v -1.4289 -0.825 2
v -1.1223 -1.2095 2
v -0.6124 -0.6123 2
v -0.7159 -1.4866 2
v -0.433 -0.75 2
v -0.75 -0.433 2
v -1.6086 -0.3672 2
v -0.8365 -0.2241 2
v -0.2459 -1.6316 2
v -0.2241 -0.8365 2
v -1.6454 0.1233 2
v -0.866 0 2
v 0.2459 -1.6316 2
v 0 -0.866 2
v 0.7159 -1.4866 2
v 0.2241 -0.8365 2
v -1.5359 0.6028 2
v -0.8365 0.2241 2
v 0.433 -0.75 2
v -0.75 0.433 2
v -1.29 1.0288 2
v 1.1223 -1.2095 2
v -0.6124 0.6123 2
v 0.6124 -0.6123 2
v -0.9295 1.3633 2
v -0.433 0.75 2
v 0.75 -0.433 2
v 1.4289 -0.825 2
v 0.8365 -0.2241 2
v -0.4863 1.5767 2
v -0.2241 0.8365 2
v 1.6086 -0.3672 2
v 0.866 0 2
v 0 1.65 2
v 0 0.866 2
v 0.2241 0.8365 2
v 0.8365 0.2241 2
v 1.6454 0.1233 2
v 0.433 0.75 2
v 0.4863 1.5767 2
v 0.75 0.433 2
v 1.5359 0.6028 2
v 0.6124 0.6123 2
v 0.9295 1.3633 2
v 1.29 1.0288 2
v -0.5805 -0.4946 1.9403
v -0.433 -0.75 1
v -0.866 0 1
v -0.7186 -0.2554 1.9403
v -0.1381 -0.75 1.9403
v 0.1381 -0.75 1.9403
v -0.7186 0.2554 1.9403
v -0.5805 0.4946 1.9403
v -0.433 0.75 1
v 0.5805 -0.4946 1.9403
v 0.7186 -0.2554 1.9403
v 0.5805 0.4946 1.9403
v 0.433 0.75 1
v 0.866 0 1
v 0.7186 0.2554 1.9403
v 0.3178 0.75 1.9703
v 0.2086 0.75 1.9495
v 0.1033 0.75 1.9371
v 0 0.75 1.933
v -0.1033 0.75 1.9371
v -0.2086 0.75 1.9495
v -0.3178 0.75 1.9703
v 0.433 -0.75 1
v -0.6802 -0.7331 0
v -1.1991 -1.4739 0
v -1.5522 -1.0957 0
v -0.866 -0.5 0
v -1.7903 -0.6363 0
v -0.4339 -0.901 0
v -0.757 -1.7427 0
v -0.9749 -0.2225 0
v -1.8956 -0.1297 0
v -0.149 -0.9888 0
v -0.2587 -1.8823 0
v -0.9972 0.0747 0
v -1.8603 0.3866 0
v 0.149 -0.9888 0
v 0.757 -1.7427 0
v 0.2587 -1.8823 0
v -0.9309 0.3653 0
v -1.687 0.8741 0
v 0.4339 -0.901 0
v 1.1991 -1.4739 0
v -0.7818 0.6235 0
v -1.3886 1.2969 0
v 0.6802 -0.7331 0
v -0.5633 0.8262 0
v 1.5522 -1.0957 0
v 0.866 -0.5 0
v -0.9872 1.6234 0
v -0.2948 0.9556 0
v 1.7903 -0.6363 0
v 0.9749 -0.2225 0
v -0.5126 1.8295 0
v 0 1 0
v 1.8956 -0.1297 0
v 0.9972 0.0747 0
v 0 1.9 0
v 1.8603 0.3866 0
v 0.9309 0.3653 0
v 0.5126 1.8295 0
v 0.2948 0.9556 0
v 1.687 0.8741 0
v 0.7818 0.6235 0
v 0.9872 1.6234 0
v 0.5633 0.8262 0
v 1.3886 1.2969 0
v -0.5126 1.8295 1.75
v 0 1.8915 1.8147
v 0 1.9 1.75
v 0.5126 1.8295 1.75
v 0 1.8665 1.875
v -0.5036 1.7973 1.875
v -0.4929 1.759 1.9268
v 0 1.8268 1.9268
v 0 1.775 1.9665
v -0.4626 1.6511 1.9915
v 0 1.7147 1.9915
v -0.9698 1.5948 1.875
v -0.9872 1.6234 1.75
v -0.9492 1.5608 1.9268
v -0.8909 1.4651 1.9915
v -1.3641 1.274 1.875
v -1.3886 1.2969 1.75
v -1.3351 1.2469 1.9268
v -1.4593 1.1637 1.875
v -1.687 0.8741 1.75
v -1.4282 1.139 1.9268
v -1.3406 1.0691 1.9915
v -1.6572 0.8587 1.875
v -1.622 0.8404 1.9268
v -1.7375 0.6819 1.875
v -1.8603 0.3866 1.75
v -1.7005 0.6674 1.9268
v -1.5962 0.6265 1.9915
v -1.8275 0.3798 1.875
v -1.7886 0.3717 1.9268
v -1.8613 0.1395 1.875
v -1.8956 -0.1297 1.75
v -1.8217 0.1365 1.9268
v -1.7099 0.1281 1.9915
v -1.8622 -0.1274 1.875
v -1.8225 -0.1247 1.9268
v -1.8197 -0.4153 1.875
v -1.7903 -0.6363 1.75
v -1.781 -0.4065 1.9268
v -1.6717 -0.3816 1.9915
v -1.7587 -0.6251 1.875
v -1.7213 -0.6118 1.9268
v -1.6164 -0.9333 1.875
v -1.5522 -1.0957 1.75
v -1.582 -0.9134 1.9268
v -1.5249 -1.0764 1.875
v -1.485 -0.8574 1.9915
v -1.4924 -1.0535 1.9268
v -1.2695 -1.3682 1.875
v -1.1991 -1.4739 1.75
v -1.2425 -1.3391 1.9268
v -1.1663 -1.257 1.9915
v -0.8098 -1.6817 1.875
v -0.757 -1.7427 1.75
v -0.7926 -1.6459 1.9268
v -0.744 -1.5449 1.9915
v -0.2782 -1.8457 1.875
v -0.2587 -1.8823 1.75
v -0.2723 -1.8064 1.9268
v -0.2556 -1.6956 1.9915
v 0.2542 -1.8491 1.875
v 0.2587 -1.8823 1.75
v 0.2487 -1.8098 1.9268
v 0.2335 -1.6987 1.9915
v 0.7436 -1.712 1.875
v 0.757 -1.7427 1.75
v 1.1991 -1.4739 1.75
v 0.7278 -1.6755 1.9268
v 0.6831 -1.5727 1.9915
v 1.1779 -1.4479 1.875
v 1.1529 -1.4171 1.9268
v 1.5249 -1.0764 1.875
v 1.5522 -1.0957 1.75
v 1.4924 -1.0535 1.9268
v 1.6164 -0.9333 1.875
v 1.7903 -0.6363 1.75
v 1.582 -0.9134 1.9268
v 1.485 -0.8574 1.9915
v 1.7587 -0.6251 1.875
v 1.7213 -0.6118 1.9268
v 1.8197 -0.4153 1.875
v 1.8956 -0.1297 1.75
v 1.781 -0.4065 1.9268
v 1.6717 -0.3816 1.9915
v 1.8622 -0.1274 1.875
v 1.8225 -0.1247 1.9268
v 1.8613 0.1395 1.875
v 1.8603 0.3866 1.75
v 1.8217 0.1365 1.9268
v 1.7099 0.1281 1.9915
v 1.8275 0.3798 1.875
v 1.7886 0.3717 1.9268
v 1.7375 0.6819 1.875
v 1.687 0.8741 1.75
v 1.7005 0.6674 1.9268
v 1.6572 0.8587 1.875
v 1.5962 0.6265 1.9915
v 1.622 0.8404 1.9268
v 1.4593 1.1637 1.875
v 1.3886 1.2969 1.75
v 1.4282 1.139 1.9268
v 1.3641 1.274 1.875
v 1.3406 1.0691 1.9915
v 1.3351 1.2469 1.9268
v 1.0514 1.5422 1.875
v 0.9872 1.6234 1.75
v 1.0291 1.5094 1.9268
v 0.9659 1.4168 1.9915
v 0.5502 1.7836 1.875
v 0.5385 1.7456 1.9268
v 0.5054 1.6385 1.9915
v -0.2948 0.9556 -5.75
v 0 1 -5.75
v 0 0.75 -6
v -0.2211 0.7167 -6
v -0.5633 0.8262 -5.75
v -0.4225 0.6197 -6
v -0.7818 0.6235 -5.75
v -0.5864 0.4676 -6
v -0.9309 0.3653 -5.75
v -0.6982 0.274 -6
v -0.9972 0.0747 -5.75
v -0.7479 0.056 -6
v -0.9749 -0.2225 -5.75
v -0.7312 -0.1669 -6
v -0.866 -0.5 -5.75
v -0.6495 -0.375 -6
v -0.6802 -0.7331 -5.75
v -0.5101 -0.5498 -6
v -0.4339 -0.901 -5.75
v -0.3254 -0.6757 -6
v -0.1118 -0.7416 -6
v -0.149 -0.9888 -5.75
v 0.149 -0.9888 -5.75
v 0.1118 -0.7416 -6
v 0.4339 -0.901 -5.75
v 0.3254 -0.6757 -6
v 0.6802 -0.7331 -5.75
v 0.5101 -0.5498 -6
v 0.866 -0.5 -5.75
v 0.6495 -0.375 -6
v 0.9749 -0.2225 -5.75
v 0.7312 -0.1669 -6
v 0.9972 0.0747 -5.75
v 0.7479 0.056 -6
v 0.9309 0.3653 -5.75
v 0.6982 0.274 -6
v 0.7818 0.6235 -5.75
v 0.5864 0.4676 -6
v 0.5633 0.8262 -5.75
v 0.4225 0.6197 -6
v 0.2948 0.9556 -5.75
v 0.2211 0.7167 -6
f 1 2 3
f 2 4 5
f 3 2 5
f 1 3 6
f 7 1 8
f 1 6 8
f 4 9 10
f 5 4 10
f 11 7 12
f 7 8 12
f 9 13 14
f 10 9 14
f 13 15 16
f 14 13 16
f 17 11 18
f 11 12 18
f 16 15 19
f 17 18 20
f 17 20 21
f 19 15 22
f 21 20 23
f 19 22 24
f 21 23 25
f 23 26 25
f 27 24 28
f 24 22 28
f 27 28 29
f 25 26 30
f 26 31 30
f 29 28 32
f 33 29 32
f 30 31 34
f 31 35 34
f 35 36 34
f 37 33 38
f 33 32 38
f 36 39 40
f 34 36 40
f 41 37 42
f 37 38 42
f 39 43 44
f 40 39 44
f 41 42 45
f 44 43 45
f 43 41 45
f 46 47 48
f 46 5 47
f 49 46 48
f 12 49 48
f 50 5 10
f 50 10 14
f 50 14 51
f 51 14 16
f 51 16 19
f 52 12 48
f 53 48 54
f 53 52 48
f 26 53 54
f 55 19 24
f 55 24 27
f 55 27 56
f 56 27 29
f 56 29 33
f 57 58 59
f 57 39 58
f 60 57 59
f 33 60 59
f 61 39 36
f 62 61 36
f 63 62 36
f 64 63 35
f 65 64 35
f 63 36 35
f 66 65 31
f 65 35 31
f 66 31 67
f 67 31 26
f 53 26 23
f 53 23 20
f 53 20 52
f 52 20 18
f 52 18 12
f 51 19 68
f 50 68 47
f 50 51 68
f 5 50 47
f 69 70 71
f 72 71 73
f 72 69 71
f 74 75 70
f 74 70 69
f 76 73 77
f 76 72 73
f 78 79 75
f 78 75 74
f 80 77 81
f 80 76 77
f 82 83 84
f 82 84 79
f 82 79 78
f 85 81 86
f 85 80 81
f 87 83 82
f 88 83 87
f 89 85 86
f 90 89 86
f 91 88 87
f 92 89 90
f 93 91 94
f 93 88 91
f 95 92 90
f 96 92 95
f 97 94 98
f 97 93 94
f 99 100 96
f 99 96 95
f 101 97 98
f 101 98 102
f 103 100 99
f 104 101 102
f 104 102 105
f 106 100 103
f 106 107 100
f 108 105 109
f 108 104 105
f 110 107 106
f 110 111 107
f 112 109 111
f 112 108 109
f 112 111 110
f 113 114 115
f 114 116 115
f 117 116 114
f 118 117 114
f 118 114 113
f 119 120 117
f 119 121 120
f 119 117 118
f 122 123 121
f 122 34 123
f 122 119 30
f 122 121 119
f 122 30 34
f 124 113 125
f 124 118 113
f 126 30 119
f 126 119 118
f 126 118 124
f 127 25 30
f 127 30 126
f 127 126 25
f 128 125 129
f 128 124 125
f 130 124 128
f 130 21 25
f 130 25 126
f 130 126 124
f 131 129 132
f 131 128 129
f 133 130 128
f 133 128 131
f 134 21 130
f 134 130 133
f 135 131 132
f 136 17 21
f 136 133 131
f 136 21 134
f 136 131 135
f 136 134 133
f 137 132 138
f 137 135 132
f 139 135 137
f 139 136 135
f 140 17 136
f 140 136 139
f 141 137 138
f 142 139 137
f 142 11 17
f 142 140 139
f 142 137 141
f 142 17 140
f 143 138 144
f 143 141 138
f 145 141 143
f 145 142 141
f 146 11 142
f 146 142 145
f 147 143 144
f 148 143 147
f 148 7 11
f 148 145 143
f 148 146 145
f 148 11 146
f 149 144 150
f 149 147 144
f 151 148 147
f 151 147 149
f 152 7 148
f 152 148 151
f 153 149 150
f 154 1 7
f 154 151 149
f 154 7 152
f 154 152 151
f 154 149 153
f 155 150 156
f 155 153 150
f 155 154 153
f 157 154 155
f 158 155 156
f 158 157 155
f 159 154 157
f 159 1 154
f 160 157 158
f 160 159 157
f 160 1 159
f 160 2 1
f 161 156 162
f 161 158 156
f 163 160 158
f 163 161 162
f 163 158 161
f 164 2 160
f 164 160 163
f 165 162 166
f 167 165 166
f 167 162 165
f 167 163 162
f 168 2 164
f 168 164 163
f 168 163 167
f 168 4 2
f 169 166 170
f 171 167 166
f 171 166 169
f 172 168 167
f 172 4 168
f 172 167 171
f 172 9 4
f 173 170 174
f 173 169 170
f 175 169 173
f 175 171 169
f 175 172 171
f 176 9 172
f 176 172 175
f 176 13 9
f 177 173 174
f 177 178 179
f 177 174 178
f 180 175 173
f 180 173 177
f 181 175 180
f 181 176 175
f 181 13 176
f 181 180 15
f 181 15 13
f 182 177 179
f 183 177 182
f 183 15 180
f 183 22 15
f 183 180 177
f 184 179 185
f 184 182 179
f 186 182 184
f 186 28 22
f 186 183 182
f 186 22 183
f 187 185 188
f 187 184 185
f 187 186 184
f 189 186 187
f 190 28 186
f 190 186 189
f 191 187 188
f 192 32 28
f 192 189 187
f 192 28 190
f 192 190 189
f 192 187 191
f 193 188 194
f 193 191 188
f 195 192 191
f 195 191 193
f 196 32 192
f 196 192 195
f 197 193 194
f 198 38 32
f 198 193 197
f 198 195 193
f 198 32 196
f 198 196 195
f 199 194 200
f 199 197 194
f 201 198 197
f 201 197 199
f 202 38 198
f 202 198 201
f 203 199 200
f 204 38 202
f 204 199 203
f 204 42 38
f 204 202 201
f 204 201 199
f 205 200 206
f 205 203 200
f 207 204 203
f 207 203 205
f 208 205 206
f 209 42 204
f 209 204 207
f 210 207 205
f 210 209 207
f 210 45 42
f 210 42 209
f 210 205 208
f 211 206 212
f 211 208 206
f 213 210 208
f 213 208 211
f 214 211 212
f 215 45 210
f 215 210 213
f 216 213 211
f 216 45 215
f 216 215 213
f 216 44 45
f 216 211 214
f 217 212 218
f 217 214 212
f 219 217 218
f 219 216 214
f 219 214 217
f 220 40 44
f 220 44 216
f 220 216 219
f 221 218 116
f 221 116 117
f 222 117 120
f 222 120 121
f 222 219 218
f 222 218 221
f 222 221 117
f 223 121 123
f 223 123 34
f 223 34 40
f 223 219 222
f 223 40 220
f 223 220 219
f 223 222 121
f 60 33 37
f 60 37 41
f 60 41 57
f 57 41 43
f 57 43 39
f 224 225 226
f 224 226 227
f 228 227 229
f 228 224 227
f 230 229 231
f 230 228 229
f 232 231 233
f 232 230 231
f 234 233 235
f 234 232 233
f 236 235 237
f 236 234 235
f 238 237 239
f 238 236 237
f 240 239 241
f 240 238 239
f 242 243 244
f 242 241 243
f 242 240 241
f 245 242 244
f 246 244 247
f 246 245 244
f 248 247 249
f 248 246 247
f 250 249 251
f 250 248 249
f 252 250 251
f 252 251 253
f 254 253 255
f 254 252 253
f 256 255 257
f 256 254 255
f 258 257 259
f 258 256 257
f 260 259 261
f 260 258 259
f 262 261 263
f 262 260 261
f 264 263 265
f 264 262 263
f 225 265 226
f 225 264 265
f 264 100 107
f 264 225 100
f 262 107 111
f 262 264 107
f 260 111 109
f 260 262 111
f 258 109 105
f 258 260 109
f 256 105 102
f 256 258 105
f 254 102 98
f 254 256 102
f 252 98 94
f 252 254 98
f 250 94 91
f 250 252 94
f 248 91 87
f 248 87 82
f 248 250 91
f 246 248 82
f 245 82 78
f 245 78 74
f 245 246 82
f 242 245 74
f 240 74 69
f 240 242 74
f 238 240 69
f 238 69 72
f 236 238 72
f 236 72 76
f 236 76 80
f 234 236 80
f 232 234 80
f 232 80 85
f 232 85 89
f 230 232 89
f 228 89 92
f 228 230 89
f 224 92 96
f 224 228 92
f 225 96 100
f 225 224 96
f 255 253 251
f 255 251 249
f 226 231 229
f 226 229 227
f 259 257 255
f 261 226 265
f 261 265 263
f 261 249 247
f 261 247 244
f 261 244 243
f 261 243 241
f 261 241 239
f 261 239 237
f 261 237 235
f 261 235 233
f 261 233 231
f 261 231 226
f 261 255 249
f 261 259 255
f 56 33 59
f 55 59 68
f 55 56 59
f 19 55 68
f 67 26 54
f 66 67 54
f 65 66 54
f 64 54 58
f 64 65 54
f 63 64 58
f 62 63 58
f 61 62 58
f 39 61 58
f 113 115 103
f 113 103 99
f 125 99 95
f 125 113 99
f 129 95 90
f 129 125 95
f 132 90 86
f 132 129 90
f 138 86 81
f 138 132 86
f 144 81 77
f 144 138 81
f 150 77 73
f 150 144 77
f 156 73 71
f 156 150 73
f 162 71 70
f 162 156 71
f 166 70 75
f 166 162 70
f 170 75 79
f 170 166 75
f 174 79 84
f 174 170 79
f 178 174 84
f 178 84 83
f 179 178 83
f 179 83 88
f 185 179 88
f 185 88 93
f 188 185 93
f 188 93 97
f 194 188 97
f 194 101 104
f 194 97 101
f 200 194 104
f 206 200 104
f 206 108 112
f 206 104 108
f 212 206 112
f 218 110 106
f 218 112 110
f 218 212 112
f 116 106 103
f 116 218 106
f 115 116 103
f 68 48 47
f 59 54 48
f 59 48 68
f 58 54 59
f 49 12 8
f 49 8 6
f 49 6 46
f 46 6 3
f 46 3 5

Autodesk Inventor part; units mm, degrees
ref_plane "YZ Plane" through (0, 0, 0) normal (1, 0, 0) x (0, 1, 0)
ref_plane "XZ Plane" through (0, 0, 0) normal (0, 1, 0) x (-1, 0, 0)
ref_plane "XY Plane" through (0, 0, 0) normal (0, 0, 1) x (1, 0, 0)
sketch "スケッチ1" plane through (0, 0, 0) normal (1, 0, 0) x (0, 1, 0)
  line L0 (0, 0) -> (1, 0) construction
  line L1 (1.9, 0) -> (1.9, 1.75)
  line L2 (1.65, 2) -> (0.866, 2)
  line L3 (0, 2) -> (0, 1.5) construction
  line L4 (1, 0) -> (1, -6)
  line L5 (1, -6) -> (0, -6)
  line L6 (0, -6) -> (0, 0)
  line L7 (1, 0) -> (1.9, 0)
  line L8 (0.866, 2) -> (0.433, 1.25) construction
  line L9 (0.433, 1.25) -> (-0.433, 1.25) construction
  line L10 (-0.433, 1.25) -> (-0.866, 2) construction
  line L11 (-0.866, 2) -> (-0.433, 2.75) construction
  line L12 (-0.433, 2.75) -> (0.433, 2.75) construction
  line L13 (0.433, 2.75) -> (0.866, 2) construction
  line L14 (0.866, 2) -> (0, 1.5)
  line L15 (0.866, 2) -> (0, 2) construction
  line L16 (0, 1.5) -> (0, 0)
  arc A0 (1.9, 1.75) -> (1.65, 2) centre (1.65, 1.75) ccw
  dimension "d0" = 1.5
  dimension "d1" = 3.8
  dimension "d2" = 2
  dimension "d3" = 6
  dimension "d4" = 2
  dimension "d6" = 0.25
  dimension "d11" = 30
revolve "回転1" add sketch "スケッチ1" angle 360 about axis through (0, 0, 1.5) along (0, 0, -1)
sketch "スケッチ2" plane through (0, 0, 2) normal (0, 0, 1) x (1, 0, 0)
  line L0 (0.866, 0) -> (0.433, -0.75)
  line L1 (0.433, -0.75) -> (-0.433, -0.75)
  line L2 (-0.433, -0.75) -> (-0.866, 0)
  line L3 (-0.866, 0) -> (-0.433, 0.75)
  line L4 (-0.433, 0.75) -> (0.433, 0.75)
  line L5 (0.433, 0.75) -> (0.866, 0)
  point P0 (0, 0)
  point P1 (0, 0)
  dimension "d8" = 1.5
extrude "押し出し1" cut sketch "スケッチ2" against normal blind 1
chamfer "面取り1" distance 0.25 angle 45 1 edges at (0, -1, -6)
properties part number "10_050_CAP_BOLT_M2X6_R1" material "鋼、炭素鋼"
